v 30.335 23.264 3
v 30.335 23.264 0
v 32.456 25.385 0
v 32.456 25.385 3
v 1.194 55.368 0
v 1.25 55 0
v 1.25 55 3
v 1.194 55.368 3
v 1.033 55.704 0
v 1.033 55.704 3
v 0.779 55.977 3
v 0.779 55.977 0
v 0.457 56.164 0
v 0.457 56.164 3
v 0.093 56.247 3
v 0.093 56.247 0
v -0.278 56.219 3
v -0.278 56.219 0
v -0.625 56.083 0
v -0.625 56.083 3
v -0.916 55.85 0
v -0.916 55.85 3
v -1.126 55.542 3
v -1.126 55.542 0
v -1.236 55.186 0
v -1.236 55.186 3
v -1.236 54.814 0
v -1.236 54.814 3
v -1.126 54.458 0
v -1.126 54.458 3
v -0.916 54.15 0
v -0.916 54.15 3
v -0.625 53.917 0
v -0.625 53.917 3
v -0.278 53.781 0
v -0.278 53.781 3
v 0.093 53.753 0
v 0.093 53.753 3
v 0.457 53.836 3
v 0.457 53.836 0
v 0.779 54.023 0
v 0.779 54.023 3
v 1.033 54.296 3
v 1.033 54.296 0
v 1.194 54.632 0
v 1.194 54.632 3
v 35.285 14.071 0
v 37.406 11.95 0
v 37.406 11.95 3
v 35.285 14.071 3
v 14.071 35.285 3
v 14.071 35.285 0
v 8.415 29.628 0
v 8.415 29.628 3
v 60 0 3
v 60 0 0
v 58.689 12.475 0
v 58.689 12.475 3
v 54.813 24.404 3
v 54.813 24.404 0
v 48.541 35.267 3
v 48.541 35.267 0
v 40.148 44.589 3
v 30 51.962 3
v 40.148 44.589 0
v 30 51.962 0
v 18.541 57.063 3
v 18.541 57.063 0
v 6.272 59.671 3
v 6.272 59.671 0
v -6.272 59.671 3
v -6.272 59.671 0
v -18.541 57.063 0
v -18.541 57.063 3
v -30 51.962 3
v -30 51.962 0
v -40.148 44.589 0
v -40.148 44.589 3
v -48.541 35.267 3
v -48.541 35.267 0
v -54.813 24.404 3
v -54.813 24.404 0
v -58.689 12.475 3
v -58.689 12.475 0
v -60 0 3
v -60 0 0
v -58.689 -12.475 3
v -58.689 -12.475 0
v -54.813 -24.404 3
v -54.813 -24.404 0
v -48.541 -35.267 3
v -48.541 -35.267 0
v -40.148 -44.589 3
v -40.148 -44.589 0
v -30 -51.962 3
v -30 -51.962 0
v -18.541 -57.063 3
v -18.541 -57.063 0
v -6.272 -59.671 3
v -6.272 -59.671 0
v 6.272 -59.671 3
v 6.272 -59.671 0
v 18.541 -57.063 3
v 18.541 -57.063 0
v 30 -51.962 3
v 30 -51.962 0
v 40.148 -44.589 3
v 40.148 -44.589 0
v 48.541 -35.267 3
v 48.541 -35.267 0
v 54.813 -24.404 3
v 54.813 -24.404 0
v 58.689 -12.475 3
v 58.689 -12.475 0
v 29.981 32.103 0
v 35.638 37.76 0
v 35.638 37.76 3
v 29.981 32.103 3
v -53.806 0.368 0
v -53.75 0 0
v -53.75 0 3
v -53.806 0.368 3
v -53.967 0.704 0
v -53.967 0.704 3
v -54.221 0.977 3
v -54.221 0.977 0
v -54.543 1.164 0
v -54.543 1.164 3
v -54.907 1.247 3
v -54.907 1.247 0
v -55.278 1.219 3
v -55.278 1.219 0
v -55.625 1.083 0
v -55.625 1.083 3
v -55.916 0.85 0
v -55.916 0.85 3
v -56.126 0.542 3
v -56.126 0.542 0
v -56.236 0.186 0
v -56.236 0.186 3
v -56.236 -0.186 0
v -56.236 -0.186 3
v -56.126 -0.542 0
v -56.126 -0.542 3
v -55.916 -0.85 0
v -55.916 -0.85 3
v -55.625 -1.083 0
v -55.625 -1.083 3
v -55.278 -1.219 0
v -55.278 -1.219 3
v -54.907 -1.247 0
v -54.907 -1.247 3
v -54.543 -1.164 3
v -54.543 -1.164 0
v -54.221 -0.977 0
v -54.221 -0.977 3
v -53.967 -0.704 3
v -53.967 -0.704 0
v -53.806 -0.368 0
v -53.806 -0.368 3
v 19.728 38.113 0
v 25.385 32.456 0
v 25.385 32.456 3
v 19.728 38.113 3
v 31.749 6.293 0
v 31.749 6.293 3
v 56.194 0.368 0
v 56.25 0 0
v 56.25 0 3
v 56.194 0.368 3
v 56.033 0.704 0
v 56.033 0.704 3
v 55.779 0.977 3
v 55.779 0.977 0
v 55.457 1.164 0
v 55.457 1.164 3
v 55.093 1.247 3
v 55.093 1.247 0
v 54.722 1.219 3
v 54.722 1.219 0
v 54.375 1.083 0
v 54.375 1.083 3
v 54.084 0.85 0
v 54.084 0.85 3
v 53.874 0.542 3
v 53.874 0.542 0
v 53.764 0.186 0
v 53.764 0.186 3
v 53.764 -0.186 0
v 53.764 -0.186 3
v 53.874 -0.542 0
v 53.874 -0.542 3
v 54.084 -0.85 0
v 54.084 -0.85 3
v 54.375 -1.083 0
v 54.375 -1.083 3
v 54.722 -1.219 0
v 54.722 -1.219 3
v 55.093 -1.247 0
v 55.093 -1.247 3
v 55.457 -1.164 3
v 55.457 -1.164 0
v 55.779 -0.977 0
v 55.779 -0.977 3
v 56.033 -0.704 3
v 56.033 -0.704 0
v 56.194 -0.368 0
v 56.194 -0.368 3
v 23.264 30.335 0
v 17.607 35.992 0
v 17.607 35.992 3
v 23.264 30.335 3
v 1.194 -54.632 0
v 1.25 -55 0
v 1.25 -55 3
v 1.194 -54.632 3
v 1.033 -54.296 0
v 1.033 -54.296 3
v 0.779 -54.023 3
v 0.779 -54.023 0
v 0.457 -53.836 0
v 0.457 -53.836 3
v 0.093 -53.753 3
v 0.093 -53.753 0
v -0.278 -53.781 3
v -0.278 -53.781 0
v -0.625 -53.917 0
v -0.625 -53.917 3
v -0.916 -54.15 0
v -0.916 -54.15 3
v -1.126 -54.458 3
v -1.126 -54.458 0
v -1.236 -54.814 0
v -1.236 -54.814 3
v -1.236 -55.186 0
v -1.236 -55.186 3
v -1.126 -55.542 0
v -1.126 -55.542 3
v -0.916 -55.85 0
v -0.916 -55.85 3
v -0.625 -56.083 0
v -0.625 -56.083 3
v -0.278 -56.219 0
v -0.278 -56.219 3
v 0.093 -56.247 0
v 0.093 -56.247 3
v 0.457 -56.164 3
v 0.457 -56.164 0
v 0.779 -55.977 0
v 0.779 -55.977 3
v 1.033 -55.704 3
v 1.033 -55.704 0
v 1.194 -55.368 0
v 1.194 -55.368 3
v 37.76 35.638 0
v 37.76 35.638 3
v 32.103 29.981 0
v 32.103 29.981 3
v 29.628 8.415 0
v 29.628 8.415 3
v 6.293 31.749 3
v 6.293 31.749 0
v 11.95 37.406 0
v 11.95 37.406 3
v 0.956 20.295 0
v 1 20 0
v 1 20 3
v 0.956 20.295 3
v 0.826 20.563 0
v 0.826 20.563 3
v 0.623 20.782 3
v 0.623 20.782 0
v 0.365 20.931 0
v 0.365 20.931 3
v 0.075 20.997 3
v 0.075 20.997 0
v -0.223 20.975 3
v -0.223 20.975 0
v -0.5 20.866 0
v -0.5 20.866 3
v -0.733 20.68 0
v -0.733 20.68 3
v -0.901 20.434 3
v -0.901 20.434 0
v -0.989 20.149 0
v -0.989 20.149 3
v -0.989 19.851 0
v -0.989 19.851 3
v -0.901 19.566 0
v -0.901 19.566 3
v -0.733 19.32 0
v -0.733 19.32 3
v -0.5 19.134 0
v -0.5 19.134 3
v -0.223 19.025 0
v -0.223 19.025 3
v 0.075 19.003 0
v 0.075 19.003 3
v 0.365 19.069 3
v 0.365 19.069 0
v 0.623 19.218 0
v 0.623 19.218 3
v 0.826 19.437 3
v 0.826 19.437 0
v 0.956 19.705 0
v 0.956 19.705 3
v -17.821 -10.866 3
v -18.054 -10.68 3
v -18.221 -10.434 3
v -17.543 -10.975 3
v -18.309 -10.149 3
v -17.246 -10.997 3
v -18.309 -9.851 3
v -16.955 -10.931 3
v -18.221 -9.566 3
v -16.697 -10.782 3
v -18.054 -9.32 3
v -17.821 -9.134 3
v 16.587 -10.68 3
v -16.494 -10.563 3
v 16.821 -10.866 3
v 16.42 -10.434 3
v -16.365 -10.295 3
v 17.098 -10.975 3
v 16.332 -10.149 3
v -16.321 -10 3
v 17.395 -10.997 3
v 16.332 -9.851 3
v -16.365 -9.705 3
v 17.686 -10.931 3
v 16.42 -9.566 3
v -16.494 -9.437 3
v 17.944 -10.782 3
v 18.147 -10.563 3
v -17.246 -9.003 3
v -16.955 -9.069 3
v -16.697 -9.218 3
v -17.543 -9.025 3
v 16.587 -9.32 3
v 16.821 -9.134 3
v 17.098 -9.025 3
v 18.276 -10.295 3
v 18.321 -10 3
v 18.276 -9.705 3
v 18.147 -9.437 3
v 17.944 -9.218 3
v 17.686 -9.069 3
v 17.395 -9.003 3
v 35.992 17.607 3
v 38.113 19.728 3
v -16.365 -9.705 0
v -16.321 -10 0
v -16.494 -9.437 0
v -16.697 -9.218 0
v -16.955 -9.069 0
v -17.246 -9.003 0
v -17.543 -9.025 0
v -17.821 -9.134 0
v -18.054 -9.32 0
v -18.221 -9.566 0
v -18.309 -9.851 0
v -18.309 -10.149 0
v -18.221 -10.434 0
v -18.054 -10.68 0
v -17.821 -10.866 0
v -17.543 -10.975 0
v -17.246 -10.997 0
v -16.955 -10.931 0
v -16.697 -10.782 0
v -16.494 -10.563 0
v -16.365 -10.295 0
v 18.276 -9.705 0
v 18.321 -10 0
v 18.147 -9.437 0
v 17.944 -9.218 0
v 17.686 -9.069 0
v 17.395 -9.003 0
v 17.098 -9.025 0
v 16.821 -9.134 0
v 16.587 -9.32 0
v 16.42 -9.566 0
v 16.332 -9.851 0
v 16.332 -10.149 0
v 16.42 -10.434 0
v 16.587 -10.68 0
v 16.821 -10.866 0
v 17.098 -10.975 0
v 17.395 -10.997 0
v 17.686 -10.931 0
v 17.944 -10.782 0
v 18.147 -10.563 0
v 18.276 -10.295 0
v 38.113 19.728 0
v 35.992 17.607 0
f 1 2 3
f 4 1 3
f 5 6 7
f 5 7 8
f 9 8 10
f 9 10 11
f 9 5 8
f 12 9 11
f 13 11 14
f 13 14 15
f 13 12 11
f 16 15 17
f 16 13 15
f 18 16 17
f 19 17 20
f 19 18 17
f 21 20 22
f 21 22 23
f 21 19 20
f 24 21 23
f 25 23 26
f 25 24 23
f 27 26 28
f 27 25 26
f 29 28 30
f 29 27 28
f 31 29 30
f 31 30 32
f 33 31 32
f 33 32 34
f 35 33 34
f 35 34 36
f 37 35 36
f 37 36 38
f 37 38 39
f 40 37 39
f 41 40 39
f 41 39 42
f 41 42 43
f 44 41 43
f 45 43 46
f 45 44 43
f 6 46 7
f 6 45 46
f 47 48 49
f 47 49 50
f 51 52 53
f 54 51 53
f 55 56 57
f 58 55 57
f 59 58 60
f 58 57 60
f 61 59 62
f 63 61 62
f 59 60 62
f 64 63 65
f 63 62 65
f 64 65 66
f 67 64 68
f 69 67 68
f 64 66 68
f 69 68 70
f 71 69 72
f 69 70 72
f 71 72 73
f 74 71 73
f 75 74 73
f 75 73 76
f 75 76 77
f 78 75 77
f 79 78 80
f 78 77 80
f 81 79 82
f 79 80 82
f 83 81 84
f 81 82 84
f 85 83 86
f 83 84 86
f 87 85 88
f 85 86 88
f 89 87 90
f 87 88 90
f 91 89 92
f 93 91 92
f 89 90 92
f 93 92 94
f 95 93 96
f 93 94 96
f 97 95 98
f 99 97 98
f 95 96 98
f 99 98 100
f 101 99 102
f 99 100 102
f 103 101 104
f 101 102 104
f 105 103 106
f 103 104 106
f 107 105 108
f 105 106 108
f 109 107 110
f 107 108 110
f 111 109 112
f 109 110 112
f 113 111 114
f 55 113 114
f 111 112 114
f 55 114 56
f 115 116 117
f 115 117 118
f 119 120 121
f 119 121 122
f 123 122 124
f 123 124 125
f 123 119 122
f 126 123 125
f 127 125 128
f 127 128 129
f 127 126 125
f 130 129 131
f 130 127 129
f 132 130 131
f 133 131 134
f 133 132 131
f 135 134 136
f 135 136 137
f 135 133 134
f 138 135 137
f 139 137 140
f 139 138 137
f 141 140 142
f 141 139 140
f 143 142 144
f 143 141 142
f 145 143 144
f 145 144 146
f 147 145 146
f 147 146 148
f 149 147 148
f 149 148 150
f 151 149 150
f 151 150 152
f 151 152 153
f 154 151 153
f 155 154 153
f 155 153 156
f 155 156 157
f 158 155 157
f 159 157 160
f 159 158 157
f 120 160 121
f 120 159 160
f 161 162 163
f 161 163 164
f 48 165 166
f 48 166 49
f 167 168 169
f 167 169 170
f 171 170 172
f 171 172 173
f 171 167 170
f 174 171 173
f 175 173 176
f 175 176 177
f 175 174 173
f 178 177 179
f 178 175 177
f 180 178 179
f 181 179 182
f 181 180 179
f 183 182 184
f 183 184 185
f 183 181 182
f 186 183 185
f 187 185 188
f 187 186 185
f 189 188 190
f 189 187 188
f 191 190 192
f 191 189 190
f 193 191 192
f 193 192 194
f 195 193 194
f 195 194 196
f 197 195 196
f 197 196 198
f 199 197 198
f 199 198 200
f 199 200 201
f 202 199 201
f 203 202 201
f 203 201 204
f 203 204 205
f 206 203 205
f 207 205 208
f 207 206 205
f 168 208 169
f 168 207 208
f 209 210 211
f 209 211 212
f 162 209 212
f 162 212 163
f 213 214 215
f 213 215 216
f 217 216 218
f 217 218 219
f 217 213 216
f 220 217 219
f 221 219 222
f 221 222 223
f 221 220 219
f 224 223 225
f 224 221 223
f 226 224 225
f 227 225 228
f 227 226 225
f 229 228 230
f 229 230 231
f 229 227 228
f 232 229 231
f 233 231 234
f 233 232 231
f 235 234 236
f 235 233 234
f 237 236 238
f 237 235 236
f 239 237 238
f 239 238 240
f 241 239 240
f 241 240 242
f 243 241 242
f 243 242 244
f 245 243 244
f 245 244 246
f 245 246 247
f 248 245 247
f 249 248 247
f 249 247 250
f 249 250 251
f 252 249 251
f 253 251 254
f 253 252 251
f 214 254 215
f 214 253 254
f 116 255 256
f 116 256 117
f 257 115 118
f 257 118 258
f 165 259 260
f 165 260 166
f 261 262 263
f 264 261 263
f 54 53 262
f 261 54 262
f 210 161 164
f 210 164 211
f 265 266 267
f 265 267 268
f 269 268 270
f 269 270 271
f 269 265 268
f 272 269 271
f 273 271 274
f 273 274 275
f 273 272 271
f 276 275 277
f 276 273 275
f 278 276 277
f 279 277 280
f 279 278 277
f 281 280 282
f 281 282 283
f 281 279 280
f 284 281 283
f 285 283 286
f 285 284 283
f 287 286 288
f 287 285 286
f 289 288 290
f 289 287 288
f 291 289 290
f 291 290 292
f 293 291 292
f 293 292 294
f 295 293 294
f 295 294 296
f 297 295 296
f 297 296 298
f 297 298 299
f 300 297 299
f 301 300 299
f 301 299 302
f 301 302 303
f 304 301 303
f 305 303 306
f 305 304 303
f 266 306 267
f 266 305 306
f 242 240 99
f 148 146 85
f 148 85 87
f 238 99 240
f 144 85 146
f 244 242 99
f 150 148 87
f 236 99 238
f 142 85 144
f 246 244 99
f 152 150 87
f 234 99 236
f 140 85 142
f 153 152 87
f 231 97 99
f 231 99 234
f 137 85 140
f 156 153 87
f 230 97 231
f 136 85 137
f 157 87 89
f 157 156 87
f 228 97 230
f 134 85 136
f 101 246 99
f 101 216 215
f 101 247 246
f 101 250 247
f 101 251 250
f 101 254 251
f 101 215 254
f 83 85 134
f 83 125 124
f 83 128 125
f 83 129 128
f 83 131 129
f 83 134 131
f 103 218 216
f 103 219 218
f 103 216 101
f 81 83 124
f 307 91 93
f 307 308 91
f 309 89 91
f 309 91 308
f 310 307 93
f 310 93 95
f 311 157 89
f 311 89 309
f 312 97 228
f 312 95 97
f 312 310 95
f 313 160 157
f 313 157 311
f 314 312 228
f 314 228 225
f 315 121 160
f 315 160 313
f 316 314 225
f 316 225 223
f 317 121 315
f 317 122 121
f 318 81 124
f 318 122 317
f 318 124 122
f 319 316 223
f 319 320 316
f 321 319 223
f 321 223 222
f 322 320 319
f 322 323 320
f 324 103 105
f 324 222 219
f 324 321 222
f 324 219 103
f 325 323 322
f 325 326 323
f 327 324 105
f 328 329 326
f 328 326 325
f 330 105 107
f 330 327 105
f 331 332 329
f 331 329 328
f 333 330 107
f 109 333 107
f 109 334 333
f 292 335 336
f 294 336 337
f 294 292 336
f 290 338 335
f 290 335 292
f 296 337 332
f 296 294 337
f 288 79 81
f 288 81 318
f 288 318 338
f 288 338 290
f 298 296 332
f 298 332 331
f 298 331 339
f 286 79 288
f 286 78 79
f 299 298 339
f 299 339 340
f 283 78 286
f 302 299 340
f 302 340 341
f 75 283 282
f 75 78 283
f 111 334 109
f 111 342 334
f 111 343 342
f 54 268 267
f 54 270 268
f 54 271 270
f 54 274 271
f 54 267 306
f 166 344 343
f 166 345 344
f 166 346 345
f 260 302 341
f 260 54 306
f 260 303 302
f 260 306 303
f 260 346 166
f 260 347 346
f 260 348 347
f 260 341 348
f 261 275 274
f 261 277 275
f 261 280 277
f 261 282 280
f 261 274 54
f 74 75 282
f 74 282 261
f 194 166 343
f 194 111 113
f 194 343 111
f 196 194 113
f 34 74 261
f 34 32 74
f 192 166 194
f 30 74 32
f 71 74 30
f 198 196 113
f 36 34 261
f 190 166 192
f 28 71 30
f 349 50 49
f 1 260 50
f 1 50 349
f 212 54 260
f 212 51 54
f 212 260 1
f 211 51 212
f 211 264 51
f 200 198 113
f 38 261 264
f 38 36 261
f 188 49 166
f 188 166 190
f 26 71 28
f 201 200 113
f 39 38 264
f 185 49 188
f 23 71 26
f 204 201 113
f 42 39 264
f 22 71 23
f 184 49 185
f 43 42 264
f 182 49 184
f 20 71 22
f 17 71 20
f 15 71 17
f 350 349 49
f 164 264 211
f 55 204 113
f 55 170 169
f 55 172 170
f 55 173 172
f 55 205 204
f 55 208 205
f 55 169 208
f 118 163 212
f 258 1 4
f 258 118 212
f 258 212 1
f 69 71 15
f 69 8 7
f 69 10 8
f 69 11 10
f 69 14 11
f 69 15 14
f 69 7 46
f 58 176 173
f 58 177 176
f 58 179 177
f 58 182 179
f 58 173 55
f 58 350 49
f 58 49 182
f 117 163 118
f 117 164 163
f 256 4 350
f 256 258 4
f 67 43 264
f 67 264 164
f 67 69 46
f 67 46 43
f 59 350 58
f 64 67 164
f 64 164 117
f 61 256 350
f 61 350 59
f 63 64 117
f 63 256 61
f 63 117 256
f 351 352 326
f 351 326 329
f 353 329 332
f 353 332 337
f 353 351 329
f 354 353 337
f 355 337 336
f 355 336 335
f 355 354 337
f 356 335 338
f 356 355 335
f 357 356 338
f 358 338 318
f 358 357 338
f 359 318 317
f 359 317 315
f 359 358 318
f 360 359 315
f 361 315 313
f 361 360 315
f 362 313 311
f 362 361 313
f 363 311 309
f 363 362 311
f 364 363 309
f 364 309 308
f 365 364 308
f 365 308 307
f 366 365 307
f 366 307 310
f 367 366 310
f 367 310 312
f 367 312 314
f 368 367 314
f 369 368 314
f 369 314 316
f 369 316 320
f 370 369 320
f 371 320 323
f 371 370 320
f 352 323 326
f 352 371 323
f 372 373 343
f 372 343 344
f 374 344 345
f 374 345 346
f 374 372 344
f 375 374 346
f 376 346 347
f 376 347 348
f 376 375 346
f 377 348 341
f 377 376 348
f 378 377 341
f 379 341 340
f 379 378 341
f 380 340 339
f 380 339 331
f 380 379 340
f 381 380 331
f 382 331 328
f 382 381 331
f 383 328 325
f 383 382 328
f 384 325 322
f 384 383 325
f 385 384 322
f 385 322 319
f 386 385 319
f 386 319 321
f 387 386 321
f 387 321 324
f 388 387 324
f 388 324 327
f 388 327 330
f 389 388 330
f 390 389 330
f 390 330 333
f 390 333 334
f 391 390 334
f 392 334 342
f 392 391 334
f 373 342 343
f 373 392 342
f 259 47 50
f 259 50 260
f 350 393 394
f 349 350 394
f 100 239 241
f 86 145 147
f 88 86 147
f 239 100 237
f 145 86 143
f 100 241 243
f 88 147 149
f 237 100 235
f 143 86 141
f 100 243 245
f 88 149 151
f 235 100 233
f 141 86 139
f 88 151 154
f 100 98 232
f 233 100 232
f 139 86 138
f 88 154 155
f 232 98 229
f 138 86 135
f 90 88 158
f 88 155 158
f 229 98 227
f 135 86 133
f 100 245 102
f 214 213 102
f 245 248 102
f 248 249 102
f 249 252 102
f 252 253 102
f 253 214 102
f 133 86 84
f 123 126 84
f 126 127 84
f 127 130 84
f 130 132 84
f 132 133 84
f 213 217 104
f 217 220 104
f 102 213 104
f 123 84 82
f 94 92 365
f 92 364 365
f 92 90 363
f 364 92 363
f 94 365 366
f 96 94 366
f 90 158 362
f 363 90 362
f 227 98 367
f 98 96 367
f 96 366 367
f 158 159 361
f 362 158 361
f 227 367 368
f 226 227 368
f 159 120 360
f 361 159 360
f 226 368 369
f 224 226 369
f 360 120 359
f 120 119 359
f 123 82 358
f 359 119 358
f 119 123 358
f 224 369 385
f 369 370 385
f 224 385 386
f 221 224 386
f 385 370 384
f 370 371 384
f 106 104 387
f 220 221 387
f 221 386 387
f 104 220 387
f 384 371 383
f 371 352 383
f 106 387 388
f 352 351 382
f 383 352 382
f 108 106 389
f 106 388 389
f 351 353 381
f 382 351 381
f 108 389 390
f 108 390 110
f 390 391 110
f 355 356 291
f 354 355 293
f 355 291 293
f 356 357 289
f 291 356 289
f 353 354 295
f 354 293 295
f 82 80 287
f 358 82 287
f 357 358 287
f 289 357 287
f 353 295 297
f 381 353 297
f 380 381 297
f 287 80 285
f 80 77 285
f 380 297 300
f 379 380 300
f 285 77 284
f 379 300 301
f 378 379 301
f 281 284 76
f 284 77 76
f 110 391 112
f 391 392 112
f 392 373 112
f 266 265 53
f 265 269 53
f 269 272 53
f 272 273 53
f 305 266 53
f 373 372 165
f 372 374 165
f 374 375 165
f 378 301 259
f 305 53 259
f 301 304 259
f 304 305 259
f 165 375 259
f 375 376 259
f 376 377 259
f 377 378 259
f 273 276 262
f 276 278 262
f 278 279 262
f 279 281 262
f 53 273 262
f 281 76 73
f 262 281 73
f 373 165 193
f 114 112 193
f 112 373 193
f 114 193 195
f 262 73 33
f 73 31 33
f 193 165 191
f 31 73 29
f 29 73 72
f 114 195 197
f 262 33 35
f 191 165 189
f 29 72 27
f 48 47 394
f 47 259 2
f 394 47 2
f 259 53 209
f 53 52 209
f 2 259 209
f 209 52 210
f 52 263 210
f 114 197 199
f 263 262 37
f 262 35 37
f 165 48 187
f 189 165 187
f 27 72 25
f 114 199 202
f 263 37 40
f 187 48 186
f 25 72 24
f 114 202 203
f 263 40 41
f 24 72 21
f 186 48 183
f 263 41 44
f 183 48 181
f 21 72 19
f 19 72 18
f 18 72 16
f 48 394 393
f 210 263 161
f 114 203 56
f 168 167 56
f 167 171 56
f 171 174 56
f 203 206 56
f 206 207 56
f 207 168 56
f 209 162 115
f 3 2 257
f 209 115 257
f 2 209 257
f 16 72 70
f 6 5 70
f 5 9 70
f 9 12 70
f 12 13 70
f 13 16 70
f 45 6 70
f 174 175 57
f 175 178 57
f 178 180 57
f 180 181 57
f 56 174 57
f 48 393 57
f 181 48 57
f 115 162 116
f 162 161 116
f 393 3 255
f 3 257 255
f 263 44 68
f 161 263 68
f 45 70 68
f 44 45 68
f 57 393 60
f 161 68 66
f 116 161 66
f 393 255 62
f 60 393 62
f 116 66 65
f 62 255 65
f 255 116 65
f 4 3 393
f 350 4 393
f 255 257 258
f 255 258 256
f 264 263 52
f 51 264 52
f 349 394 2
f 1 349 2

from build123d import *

# Parameters (mm, degrees)
SKETCH_1_R      = 60
SKETCH_1_R_2    = 1.25
SKETCH_1_R_3    = 1
EXTRUDE_1_DEPTH = 3


with BuildPart() as part:
    # 草图1 → 凸台-拉伸1 (new body)
    with BuildSketch(Plane.XY):
        Circle(SKETCH_1_R)
        with Locations((55, 0)):
            Circle(SKETCH_1_R_2, mode=Mode.SUBTRACT)
        with Locations((0, 55)):
            Circle(SKETCH_1_R_2, mode=Mode.SUBTRACT)
        with Locations((0, -55)):
            Circle(SKETCH_1_R_2, mode=Mode.SUBTRACT)
        with Locations((-55, 0)):
            Circle(SKETCH_1_R_2, mode=Mode.SUBTRACT)
        with Locations((0, 20)):
            Circle(SKETCH_1_R_3, mode=Mode.SUBTRACT)
        with Locations((17.320508076, -10)):
            Circle(SKETCH_1_R_3, mode=Mode.SUBTRACT)
        with Locations((-17.320508076, -10)):
            Circle(SKETCH_1_R_3, mode=Mode.SUBTRACT)
        Polygon((35.991735162, 17.606958852), (30.334880913, 23.263813101), (32.456201256, 25.385133445), (38.113055506, 19.728279195), align=None, mode=Mode.SUBTRACT)
        Polygon((23.263813101, 30.334880913), (25.385133445, 32.456201256), (19.728279195, 38.113055506), (17.606958852, 35.991735162), align=None, mode=Mode.SUBTRACT)
        Polygon((11.950104602, 37.405948725), (14.071424946, 35.284628381), (8.414570696, 29.627774132), (6.293250353, 31.749094475), align=None, mode=Mode.SUBTRACT)
        Polygon((31.749094475, 6.293250353), (37.405948725, 11.950104602), (35.284628381, 14.071424946), (29.627774132, 8.414570696), align=None, mode=Mode.SUBTRACT)
        Polygon((29.981327522, 32.102647866), (32.102647866, 29.981327522), (37.759502115, 35.638181772), (35.638181772, 37.759502115), align=None, mode=Mode.SUBTRACT)
    extrude(amount=EXTRUDE_1_DEPTH)


solid = part.part
